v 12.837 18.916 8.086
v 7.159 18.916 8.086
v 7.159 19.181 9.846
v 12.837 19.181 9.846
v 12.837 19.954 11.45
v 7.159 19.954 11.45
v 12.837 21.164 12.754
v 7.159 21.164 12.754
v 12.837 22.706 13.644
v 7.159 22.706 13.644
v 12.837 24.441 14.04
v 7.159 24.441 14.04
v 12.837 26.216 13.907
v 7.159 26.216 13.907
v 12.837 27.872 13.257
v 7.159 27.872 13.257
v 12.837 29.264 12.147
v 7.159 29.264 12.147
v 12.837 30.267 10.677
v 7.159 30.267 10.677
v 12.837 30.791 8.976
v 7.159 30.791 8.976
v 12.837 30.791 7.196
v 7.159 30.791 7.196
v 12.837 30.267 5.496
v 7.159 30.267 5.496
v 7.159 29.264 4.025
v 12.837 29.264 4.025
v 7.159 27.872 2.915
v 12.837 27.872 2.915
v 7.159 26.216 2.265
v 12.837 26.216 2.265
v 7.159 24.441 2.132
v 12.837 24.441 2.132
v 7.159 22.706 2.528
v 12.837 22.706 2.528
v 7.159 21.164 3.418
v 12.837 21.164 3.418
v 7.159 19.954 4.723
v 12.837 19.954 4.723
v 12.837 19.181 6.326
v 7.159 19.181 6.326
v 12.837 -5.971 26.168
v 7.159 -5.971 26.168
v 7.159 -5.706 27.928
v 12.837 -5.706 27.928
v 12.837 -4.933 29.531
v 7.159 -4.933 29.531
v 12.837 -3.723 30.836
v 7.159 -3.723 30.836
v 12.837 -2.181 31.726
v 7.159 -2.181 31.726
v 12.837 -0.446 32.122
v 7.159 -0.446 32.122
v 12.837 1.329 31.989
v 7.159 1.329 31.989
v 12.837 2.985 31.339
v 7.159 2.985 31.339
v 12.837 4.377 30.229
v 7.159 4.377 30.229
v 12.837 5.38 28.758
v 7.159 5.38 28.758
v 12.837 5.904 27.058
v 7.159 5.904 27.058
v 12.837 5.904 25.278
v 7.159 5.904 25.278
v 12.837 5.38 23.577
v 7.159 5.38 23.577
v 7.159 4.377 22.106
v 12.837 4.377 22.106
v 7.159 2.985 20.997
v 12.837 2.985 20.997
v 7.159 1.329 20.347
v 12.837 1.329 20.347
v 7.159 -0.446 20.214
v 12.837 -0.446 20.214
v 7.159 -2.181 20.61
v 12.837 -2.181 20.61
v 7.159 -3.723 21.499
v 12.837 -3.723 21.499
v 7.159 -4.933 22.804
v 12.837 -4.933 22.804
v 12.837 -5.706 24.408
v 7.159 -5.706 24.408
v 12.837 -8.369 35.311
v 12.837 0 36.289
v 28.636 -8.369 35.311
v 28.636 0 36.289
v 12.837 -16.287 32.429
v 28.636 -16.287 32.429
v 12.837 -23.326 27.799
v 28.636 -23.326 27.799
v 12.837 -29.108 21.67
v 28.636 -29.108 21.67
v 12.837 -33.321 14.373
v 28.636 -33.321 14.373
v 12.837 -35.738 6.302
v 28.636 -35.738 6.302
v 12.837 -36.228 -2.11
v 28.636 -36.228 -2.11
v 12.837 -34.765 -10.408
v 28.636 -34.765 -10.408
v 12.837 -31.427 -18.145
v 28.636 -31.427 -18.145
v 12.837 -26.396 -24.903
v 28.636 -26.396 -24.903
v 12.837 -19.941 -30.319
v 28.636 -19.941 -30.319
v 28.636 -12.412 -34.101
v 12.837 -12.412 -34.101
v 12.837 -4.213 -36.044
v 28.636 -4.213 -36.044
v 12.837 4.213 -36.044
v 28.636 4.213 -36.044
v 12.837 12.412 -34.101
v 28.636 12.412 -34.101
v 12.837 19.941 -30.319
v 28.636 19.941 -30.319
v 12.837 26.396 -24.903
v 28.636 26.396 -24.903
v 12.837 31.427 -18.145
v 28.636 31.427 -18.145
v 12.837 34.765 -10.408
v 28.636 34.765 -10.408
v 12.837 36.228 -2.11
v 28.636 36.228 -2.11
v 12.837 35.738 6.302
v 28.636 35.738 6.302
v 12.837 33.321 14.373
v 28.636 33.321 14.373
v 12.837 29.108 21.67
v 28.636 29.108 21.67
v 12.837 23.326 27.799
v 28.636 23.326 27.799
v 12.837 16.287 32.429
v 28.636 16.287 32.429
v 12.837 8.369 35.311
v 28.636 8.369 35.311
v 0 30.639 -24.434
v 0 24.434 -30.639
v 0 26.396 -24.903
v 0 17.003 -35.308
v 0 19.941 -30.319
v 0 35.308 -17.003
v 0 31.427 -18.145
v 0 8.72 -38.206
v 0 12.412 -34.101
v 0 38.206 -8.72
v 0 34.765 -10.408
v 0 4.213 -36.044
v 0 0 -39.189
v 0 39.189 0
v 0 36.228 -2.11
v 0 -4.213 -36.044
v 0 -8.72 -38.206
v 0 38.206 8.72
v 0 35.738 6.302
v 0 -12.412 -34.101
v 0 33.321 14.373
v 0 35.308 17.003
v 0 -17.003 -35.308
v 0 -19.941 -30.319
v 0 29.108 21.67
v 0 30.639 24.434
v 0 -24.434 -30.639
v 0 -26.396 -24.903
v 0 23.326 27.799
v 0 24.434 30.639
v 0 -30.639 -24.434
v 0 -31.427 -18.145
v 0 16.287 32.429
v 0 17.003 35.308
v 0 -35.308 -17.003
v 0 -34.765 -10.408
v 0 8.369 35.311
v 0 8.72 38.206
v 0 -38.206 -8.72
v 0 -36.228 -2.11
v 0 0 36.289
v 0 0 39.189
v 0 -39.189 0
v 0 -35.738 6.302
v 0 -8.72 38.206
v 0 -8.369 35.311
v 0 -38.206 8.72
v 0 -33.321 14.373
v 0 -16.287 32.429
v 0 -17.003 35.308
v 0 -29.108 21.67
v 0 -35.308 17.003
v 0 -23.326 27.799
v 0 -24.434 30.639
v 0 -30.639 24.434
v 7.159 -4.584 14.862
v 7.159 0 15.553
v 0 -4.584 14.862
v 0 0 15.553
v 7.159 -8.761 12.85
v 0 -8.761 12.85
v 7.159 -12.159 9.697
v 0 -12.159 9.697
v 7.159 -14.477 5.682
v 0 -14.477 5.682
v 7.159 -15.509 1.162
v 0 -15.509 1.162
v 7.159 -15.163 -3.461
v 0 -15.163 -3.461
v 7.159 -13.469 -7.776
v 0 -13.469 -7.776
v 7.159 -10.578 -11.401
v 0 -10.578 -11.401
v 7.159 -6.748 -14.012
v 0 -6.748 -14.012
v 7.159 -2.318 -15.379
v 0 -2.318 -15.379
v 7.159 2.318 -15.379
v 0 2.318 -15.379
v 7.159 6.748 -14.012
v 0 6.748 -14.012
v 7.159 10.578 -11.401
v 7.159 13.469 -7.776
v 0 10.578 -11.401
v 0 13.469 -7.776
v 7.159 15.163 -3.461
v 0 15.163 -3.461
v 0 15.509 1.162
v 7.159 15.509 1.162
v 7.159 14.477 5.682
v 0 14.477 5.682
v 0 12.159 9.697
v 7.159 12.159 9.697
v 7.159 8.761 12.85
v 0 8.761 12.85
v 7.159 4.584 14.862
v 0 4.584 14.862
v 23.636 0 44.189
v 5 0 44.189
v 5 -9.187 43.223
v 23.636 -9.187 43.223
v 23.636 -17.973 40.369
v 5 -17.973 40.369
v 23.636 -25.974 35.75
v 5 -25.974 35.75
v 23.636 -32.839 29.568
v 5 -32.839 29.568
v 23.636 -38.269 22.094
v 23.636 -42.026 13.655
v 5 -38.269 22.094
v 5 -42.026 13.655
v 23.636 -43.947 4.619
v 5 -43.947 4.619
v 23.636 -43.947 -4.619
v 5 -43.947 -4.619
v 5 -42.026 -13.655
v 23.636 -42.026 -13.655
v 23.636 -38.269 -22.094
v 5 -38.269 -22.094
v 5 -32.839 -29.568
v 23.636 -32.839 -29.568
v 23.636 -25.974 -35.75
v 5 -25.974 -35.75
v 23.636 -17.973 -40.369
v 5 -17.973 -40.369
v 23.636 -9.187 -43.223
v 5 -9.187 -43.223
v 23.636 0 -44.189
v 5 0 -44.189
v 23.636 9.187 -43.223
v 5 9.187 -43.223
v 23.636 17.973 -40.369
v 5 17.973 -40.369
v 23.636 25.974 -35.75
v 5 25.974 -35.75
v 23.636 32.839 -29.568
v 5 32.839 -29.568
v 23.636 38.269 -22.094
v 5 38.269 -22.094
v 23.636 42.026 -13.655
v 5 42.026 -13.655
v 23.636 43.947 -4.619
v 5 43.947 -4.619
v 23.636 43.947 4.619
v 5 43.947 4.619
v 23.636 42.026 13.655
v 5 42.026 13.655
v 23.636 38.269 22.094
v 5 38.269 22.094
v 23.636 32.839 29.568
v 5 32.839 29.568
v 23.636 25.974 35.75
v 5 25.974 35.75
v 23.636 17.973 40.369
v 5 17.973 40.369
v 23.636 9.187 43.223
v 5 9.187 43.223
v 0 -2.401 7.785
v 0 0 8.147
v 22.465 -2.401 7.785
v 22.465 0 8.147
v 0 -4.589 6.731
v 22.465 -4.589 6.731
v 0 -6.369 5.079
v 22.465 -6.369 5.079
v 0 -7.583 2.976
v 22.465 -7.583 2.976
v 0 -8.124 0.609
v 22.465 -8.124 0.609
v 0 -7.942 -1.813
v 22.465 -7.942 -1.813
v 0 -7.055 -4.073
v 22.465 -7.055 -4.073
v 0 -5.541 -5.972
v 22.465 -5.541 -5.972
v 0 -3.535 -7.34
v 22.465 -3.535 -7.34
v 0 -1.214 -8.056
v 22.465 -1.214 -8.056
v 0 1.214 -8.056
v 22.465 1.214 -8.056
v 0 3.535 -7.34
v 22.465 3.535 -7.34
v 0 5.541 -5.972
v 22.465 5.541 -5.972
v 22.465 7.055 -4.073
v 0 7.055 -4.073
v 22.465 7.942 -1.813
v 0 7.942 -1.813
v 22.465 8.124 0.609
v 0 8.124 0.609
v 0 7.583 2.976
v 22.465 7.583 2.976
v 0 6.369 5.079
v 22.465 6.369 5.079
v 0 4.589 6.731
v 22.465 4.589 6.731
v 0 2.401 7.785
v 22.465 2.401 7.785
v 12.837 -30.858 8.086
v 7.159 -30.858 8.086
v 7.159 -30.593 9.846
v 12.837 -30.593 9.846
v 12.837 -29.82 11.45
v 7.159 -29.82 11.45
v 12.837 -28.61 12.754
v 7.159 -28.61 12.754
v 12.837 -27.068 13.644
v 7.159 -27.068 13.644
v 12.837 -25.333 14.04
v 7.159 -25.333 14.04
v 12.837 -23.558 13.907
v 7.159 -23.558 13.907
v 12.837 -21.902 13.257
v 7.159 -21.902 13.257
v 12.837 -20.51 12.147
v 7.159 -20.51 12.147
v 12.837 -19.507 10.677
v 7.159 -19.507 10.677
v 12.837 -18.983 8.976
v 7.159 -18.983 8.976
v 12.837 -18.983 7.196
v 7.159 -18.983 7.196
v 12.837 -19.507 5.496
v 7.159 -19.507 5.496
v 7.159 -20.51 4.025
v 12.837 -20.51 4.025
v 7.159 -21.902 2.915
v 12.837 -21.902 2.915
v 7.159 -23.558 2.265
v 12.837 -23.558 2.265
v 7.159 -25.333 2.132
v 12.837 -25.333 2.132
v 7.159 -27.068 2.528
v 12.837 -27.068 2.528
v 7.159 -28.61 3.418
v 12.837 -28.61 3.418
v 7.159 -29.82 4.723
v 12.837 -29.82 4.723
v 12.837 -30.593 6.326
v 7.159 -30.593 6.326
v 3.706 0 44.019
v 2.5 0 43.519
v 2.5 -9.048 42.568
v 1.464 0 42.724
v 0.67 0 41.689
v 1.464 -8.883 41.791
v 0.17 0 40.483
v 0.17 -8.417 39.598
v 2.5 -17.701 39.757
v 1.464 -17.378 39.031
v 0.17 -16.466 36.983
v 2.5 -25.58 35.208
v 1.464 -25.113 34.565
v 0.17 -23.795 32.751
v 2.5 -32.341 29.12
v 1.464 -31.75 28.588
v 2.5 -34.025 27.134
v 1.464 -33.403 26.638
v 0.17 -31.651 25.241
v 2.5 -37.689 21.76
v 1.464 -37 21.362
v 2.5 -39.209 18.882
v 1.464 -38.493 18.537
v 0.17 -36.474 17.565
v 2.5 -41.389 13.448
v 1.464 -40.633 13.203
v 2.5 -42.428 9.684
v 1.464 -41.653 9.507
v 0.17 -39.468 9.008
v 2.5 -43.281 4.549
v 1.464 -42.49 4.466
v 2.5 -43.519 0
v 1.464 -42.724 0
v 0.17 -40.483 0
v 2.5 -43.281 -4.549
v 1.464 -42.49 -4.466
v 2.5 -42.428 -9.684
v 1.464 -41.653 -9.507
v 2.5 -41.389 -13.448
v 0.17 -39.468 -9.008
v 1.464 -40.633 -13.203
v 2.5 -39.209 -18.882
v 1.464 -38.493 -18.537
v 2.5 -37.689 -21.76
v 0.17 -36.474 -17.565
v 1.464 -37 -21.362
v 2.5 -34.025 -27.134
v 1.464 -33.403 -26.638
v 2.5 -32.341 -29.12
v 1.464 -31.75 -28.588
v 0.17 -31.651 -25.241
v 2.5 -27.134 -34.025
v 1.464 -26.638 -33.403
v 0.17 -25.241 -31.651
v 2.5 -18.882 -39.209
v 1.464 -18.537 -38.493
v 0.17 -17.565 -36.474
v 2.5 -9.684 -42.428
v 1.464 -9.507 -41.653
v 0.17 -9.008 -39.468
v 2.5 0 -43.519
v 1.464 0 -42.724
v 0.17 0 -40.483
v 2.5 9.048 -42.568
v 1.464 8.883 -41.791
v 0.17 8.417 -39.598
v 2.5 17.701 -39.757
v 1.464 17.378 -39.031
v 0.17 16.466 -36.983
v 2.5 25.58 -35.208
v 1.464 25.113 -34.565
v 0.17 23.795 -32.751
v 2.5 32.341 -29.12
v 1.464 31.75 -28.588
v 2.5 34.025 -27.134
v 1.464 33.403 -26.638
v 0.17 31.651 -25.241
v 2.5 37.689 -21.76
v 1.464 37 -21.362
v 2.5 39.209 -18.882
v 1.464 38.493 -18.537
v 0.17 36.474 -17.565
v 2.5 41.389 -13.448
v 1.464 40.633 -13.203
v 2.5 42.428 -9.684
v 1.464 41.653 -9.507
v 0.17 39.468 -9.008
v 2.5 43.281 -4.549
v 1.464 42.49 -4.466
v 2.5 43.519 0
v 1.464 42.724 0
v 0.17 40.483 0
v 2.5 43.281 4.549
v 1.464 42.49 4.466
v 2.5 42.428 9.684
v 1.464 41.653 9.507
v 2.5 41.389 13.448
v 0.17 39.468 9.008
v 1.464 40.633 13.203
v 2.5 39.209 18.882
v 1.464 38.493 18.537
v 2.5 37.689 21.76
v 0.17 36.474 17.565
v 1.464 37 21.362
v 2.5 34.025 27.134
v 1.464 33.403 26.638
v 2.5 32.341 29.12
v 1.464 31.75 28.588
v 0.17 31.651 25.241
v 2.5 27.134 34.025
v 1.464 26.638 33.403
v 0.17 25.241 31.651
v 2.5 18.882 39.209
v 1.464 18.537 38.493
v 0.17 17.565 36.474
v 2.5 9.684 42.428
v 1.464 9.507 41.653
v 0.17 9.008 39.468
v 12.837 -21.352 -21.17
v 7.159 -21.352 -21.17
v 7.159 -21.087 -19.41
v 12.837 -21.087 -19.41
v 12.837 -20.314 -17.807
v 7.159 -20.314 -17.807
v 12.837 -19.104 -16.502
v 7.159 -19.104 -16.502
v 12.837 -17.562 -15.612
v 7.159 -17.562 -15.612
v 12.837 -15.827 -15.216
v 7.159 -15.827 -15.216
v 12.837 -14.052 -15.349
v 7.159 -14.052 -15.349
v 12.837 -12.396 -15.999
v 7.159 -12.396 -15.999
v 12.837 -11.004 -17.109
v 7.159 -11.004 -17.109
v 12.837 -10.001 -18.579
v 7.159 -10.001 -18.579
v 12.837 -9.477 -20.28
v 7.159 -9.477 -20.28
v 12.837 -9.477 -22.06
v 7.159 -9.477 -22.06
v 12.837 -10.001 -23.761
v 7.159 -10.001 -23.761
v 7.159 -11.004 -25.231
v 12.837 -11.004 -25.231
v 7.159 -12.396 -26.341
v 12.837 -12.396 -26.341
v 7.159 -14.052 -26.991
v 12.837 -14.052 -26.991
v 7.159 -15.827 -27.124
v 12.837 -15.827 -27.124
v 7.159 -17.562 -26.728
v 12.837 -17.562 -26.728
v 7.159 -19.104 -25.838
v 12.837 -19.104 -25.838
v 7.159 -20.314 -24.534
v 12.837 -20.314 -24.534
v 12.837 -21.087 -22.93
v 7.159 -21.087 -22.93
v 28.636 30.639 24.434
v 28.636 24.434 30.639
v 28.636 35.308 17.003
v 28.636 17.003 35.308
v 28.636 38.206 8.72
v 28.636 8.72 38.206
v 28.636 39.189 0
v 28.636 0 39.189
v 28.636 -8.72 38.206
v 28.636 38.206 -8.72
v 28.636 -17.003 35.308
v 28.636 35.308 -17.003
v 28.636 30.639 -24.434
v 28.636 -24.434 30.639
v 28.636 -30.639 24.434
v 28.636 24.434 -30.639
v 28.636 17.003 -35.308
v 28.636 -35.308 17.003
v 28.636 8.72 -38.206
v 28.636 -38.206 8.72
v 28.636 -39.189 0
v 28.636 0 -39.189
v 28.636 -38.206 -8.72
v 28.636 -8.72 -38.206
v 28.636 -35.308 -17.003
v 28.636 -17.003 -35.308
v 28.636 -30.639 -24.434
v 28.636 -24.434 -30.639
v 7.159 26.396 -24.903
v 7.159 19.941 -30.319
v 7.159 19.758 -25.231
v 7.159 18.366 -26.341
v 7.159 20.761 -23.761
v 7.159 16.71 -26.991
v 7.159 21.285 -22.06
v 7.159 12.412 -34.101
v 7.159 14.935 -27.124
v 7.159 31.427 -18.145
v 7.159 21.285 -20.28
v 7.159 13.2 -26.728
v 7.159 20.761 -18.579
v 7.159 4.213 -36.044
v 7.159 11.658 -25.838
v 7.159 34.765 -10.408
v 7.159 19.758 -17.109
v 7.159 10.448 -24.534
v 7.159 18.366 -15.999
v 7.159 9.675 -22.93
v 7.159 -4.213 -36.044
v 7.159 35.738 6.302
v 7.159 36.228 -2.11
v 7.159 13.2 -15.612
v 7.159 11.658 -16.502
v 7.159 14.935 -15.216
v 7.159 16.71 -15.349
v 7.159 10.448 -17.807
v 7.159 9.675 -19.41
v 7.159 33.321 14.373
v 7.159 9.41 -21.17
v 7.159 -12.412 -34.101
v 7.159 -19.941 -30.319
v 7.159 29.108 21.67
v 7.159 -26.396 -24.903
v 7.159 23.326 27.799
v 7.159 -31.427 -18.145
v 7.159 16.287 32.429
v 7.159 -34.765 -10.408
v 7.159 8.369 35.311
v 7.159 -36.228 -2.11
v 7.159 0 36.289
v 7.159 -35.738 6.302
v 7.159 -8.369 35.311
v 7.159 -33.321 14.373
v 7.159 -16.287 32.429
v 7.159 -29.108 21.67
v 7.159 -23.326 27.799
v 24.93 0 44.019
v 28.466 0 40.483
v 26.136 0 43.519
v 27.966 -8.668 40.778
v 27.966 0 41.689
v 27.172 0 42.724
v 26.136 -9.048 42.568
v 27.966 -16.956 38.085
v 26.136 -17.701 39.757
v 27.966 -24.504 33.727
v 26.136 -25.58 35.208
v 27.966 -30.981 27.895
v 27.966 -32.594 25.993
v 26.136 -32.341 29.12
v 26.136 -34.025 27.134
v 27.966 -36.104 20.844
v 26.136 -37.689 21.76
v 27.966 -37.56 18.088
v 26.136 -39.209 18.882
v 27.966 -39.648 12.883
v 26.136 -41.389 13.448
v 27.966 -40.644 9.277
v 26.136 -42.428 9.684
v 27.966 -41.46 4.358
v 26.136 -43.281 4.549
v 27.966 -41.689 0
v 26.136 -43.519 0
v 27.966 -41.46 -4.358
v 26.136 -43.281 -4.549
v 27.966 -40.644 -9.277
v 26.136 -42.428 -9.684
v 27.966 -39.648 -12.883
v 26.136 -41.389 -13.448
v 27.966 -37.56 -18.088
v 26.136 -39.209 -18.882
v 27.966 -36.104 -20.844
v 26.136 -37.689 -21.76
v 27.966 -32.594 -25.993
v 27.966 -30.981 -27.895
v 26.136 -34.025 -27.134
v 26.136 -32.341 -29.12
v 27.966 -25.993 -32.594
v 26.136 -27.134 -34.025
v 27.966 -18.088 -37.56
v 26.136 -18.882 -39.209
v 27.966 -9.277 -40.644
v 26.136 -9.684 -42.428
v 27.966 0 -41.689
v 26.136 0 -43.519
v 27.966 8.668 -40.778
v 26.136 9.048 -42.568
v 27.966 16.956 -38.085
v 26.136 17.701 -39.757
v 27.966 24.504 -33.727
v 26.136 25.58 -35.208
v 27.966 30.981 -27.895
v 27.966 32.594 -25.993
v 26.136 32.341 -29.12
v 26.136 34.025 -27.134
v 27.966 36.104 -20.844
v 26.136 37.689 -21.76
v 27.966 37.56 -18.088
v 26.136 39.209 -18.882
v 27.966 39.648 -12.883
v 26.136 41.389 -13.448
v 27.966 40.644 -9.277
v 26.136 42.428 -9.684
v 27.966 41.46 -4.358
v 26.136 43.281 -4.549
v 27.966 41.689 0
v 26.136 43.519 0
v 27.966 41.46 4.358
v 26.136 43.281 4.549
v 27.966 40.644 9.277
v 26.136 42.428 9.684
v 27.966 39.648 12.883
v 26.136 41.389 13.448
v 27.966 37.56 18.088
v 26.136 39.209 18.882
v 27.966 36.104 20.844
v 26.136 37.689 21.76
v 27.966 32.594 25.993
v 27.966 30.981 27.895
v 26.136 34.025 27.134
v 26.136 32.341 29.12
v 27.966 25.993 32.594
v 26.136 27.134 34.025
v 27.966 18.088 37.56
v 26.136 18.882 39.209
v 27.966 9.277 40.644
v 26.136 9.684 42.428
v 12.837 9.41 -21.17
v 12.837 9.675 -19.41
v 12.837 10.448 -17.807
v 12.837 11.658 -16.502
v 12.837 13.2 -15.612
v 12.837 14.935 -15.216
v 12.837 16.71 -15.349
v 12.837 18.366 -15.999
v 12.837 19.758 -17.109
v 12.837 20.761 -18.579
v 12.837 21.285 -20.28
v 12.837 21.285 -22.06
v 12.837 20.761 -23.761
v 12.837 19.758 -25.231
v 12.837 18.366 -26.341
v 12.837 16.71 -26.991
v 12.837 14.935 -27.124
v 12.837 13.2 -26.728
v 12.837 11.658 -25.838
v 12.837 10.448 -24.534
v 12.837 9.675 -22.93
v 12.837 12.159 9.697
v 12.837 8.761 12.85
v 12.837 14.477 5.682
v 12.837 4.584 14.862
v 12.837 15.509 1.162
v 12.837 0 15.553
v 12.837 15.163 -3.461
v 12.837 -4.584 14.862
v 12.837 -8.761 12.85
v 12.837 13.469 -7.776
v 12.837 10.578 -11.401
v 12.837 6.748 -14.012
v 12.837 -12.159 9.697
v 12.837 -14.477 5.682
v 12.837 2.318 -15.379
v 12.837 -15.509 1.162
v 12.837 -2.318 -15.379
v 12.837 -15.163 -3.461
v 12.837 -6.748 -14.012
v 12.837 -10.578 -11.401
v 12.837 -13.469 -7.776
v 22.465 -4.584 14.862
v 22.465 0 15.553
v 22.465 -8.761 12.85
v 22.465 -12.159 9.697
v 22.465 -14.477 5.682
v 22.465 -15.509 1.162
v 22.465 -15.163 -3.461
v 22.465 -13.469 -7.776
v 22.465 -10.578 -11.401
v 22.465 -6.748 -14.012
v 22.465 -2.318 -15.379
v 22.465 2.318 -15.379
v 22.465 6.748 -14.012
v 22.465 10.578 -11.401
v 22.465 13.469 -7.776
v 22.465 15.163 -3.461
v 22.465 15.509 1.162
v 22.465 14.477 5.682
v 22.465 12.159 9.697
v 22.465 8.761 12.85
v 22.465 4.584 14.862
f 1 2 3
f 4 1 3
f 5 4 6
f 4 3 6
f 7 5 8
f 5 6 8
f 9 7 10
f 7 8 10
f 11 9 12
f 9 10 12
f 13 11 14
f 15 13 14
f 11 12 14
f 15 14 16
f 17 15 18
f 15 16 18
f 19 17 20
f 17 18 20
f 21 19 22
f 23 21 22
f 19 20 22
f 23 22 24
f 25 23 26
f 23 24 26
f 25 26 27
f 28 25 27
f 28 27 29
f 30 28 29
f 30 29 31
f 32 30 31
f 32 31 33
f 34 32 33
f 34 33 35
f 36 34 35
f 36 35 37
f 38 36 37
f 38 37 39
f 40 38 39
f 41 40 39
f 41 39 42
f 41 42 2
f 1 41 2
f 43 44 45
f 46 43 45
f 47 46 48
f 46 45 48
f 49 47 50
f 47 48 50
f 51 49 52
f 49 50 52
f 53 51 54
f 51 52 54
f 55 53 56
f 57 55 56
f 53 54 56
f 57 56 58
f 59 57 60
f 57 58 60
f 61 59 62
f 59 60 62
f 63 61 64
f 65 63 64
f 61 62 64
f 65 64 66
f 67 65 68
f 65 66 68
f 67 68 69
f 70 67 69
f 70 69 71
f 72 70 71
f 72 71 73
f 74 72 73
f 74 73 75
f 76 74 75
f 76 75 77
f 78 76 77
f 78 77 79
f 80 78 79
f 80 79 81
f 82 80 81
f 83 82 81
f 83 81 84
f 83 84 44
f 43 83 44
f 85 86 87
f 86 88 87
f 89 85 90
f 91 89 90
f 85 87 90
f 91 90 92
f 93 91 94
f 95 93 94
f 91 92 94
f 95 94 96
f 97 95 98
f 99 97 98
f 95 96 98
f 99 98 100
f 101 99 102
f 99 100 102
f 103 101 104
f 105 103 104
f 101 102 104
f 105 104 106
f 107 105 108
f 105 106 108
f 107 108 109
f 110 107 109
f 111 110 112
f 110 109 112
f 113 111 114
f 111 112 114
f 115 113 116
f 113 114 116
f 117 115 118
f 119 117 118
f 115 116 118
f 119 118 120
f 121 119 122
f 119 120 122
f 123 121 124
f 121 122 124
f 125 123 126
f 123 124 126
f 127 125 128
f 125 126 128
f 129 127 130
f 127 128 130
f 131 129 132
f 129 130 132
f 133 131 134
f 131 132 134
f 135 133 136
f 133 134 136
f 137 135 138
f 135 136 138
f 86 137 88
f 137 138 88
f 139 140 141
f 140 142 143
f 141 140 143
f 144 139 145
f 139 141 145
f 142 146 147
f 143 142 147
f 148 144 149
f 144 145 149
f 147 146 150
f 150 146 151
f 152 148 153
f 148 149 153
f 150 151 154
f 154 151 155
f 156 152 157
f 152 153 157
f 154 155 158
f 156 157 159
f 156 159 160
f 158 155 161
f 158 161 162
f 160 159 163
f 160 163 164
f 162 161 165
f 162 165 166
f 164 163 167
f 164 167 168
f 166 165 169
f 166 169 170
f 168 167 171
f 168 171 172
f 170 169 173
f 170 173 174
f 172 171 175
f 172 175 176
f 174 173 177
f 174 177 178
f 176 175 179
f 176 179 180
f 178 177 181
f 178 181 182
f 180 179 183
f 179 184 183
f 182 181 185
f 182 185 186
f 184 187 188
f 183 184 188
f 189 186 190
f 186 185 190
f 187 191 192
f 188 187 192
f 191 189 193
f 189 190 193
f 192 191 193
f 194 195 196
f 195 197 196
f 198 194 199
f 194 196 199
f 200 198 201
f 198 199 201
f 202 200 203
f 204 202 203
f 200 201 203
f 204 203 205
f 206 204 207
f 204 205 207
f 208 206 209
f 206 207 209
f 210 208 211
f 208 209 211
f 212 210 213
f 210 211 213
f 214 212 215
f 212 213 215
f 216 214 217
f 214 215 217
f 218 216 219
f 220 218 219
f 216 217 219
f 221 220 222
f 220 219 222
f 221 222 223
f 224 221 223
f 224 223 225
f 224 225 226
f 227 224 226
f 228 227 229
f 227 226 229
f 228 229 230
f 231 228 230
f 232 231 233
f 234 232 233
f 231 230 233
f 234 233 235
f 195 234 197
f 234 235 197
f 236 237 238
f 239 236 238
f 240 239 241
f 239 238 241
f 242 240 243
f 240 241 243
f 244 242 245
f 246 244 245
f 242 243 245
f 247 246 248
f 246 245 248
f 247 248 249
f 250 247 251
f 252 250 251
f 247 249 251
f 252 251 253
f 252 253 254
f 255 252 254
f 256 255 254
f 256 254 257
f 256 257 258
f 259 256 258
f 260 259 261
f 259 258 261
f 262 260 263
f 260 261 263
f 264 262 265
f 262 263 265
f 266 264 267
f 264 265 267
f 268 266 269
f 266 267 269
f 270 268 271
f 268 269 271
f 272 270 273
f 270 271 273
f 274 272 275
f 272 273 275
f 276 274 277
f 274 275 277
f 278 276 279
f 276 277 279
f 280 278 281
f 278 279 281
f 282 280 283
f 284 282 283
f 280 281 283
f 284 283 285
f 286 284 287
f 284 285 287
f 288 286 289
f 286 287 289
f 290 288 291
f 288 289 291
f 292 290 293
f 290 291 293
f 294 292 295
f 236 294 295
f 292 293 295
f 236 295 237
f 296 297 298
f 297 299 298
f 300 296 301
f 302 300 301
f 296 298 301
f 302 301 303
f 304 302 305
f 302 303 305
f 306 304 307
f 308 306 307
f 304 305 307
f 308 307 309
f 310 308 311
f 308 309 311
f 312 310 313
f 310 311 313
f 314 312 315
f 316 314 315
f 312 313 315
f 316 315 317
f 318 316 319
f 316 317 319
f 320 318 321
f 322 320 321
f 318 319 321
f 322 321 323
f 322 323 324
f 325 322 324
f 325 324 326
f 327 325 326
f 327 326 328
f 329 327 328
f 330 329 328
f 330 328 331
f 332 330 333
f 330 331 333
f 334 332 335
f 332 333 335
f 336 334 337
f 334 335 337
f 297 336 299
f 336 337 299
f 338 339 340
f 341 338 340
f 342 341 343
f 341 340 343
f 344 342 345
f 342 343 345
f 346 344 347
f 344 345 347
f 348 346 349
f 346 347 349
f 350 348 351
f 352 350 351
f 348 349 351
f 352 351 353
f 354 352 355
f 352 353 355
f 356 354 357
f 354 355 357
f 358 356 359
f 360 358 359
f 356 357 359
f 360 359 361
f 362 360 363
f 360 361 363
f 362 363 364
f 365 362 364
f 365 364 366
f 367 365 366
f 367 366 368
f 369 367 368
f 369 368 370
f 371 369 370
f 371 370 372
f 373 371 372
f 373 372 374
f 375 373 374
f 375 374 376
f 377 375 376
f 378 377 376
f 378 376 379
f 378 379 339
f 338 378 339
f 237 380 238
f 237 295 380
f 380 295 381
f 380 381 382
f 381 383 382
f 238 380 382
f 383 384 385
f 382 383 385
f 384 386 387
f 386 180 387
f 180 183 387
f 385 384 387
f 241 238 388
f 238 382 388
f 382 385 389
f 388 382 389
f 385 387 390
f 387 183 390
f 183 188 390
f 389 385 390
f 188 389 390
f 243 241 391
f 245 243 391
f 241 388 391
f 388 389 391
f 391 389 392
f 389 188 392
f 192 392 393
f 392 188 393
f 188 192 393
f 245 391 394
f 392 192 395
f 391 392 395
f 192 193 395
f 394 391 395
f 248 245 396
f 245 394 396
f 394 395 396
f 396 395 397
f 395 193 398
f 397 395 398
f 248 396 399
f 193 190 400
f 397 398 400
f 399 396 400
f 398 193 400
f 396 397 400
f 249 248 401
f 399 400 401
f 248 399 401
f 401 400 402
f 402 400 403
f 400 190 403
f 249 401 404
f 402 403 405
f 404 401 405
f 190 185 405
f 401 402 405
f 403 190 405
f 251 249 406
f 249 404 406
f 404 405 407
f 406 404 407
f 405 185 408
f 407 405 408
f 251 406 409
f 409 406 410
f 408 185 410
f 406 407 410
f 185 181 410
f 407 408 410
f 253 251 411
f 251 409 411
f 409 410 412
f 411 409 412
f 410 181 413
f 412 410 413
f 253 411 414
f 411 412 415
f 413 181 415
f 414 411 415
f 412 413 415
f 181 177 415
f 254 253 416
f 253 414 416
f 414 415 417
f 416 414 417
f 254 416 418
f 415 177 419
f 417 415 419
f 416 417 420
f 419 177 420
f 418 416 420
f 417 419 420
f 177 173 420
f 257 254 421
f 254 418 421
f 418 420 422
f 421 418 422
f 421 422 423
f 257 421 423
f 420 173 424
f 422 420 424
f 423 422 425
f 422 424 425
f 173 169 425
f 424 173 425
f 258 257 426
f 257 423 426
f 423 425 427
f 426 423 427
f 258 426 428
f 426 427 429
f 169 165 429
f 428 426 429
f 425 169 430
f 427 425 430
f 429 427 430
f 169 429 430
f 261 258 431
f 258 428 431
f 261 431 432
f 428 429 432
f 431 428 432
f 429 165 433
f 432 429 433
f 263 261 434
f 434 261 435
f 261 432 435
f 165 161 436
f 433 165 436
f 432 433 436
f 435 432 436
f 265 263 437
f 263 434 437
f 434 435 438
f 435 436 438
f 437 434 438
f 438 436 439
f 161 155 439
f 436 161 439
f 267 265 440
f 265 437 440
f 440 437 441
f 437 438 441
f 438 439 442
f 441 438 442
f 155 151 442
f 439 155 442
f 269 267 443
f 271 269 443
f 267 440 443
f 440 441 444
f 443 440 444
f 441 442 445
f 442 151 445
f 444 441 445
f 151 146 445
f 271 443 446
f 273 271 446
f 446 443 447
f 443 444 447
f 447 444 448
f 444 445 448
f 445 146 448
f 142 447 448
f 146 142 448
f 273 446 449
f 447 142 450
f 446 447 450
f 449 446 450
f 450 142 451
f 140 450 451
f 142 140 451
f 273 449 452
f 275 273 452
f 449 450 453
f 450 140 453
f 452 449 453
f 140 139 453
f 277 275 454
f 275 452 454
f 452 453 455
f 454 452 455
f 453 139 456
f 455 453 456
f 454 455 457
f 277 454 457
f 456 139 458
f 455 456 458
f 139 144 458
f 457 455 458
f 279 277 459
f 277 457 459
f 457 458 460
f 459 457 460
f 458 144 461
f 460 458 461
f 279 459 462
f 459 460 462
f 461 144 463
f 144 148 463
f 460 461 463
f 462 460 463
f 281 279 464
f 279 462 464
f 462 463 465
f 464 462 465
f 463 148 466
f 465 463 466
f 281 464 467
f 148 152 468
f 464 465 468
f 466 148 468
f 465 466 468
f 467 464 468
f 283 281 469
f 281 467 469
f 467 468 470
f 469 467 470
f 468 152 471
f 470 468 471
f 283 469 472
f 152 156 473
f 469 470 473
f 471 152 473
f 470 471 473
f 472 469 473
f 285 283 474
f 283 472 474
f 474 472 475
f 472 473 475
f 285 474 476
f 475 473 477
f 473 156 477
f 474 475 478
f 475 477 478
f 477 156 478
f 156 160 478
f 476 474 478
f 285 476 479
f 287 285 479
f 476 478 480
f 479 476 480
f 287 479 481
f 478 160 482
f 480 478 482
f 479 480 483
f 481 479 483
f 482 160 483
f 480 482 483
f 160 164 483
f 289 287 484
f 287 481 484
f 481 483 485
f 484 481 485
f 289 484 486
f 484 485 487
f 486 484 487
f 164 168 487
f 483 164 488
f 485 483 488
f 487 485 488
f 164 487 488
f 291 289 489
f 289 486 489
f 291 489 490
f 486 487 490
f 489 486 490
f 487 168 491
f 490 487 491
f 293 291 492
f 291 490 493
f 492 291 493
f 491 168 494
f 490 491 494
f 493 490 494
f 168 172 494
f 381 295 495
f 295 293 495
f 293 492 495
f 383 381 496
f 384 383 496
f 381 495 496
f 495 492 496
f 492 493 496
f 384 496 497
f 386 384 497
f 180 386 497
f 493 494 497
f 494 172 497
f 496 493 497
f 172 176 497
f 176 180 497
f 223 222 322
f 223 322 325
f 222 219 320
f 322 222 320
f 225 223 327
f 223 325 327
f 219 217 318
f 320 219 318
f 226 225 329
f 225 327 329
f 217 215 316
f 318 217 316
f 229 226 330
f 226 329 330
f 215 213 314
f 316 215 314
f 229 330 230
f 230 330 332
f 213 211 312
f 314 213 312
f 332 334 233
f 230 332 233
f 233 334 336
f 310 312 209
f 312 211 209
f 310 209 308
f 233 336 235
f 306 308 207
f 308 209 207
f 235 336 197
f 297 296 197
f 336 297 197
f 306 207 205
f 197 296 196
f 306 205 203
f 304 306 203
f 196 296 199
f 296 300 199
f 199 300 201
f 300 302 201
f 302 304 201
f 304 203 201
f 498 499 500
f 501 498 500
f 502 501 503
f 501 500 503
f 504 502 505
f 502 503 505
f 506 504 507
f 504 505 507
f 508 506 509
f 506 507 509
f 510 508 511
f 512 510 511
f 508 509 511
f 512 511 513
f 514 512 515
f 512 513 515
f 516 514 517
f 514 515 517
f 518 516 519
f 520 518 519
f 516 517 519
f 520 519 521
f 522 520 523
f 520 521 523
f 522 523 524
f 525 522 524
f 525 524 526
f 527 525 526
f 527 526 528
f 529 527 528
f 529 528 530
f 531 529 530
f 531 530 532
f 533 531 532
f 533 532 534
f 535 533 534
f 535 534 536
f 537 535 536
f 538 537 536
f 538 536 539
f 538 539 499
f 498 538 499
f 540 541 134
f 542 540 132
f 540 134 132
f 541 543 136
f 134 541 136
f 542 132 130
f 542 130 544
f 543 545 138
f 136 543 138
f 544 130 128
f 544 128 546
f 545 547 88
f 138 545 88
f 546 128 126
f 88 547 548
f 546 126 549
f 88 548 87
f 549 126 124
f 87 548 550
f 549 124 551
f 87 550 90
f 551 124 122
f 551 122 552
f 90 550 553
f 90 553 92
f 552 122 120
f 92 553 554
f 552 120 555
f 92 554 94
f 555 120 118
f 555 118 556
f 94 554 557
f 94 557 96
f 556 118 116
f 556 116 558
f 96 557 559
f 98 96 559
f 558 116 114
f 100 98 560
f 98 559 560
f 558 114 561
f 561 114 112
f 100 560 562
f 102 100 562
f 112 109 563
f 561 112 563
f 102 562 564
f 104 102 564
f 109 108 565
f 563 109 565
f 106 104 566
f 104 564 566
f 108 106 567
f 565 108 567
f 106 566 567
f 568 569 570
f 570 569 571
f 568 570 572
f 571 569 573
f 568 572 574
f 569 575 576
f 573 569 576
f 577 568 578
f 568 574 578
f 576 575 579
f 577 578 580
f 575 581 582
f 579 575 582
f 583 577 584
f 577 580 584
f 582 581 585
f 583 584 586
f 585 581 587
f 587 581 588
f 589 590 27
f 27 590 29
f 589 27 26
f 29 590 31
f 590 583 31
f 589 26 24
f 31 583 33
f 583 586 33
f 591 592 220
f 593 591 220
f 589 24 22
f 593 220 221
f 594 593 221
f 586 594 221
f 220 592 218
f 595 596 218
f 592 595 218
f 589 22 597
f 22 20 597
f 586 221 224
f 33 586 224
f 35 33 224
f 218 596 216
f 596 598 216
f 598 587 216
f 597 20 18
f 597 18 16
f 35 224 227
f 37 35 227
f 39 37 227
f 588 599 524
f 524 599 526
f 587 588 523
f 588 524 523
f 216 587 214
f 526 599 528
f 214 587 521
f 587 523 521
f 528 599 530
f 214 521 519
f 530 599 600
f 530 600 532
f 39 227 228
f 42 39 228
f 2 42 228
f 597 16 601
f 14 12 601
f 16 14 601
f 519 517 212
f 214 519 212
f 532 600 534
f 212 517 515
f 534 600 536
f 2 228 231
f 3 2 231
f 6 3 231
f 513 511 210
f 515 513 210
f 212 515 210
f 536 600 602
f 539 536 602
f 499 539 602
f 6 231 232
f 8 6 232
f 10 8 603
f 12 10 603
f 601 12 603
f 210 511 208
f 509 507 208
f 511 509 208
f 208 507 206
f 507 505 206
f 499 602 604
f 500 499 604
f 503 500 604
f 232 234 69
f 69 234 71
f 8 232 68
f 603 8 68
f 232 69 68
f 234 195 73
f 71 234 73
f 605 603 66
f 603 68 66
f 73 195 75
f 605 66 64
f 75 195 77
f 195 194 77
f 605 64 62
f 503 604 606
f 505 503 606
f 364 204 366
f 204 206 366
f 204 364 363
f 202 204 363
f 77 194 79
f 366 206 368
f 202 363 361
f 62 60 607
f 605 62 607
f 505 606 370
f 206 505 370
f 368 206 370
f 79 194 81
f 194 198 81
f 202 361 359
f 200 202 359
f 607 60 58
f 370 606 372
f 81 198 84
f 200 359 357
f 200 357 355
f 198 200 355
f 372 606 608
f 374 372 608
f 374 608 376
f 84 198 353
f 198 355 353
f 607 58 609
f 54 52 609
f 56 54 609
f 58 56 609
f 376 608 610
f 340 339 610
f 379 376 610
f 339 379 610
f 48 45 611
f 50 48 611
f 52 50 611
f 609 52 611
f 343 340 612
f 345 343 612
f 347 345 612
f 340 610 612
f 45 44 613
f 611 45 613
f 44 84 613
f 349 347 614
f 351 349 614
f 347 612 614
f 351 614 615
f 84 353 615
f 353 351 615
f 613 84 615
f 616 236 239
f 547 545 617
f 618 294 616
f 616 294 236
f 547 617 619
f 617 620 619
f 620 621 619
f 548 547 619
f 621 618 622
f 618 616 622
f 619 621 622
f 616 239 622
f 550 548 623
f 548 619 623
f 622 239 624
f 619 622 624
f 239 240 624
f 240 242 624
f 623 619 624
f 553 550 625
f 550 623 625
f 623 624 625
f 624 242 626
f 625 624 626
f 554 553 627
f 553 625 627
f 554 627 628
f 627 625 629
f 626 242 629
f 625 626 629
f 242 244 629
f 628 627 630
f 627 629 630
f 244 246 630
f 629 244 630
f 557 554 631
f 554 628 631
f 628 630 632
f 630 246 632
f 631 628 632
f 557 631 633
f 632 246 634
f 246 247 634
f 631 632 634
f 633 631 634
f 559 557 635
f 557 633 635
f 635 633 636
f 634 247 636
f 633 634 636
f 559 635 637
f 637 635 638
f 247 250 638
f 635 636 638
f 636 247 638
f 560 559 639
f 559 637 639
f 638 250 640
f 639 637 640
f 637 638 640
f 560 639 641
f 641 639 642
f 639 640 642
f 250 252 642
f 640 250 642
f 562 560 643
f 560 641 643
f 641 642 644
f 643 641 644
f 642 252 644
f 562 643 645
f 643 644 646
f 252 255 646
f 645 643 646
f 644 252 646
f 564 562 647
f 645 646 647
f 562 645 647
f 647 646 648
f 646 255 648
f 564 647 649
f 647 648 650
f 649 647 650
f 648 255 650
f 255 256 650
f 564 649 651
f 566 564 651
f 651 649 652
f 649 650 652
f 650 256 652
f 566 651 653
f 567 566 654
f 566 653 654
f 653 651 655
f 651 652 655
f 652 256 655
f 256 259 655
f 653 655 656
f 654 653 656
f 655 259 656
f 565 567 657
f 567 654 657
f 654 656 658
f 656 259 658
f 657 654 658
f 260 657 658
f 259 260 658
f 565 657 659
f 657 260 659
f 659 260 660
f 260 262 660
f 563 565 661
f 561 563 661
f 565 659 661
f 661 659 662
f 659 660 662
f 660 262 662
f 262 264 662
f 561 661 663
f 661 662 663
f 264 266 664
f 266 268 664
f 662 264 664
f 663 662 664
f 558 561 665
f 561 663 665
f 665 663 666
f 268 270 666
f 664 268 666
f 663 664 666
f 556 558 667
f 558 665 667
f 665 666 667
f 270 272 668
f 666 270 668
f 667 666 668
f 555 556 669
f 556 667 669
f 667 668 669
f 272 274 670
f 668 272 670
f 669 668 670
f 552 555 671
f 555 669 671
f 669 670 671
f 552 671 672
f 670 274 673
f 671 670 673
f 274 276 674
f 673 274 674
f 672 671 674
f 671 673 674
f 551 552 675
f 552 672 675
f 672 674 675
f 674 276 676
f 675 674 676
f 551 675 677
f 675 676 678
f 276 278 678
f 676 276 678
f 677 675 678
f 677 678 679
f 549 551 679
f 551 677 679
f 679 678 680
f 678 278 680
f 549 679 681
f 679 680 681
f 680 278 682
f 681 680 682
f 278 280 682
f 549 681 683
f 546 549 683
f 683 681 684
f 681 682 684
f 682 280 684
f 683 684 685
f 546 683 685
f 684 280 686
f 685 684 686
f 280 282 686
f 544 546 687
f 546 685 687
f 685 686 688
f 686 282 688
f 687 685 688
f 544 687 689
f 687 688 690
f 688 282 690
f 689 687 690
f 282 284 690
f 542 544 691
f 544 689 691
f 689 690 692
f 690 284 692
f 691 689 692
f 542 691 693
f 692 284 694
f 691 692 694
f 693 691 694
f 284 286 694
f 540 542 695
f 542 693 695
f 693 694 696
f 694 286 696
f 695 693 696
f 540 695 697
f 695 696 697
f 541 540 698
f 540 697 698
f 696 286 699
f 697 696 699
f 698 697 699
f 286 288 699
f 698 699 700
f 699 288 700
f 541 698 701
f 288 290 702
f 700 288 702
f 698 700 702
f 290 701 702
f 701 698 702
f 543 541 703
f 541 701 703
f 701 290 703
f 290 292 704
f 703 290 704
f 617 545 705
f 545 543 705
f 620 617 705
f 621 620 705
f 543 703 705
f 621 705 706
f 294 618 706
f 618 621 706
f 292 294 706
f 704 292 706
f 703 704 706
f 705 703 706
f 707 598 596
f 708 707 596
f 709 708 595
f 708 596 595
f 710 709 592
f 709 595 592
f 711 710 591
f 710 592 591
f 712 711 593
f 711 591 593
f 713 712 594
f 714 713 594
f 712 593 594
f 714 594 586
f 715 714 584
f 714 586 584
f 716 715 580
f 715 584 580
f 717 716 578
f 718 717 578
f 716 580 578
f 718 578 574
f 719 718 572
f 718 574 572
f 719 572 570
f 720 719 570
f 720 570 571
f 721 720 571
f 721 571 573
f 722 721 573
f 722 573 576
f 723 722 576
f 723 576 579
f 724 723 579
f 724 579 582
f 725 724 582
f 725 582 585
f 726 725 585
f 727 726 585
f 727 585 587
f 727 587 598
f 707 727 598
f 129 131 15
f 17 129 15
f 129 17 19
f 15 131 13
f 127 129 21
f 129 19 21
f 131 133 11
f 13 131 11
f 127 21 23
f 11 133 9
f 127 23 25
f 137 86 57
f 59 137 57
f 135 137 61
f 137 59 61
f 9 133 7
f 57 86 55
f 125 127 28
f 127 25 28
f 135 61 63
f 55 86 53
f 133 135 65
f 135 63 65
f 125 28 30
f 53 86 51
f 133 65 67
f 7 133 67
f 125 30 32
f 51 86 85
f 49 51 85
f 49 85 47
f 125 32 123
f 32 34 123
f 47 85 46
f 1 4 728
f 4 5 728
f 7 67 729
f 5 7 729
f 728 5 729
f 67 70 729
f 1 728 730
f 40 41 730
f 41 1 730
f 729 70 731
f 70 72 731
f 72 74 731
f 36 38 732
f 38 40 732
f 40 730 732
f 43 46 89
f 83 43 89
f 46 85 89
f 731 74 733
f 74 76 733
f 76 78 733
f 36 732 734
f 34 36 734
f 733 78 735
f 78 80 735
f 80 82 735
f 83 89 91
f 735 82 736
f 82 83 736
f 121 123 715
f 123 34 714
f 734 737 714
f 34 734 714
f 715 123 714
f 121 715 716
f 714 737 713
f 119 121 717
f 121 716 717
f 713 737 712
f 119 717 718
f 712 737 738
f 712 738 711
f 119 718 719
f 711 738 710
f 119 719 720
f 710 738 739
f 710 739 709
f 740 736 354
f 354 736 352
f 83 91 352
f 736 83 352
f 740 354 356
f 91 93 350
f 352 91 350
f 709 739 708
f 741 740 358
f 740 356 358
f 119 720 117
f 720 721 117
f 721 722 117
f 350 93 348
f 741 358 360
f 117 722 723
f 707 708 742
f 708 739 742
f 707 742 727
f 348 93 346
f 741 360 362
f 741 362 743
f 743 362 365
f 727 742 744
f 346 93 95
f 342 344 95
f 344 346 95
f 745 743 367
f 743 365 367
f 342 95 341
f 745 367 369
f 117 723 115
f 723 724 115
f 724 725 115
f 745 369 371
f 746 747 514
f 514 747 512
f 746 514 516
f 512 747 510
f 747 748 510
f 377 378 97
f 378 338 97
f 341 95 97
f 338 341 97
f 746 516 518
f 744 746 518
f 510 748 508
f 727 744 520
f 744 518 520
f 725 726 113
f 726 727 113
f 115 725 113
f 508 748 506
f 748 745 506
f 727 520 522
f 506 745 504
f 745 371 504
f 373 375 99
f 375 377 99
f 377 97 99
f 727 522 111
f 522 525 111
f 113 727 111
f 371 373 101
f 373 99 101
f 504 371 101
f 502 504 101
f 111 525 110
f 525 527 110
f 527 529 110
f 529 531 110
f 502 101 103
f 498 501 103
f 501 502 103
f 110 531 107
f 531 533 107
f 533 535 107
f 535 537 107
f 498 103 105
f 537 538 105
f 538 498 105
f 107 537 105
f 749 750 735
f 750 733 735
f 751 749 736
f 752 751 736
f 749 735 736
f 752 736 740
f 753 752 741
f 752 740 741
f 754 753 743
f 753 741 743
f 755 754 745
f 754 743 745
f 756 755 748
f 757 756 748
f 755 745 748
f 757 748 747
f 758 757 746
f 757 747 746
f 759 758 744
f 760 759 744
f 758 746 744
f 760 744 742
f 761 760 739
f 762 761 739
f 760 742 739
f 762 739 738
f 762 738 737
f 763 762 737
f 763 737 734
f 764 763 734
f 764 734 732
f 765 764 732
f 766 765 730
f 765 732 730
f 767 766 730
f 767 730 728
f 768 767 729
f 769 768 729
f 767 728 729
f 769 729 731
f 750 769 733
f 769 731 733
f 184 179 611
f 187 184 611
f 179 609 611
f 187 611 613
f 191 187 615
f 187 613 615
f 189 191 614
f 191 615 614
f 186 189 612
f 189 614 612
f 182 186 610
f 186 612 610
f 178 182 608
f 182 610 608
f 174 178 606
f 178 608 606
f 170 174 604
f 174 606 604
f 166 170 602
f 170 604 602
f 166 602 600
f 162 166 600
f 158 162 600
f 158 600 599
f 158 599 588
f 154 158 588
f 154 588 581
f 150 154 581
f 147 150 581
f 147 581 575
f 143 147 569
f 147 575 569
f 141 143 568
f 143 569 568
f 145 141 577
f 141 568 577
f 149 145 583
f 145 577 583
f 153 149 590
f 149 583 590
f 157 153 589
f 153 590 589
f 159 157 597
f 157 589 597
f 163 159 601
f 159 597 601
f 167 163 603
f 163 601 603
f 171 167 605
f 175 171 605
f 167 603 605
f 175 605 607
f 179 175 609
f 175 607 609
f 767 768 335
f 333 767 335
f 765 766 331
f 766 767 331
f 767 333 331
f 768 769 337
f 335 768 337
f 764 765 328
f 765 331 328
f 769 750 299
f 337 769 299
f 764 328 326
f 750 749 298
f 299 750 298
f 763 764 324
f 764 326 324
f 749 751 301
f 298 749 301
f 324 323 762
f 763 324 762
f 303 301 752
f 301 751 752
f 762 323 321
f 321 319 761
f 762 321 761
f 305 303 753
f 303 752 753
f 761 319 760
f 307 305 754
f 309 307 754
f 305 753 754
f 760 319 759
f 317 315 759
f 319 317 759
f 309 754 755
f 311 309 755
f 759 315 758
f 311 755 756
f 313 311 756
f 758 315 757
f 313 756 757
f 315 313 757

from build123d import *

# Parameters (mm, degrees)
F3_R     = 5
F2_R     = 5.970873
F4_DEPTH = 25


with BuildPart() as f1:
    # F0 (on Front) → F1 (revolve)
    with BuildSketch(Plane.XZ):
        Polygon((7.159092, 15.552509), (0, 15.552509), (0, 8.146551), (22.464735, 8.146551), (22.464735, 15.552509), (12.836992, 15.552509), (12.836992, 36.289185), (28.636364, 36.289185), (28.636364, 44.188876), (0, 44.188876), (0, 36.289185), (7.159092, 36.289185), align=None)
    revolve(axis=Axis((9.257446, 0, 0), (1, 0, 0)))

    # F3
    f3_edges = [f1.edges().sort_by_distance(p)[0] for p in [
        (28.636364, 0, -44.188876),
        (0, 0, -44.188876),
    ]]
    fillet(f3_edges, radius=F3_R)

    # F2 (on face) → F4 (cut)
    with BuildSketch(Plane(origin=(7.159092, 0, 0), x_dir=(0, -1, 0), z_dir=(-1, 0, 0))):
        with Locations((0, 26.167713)):
            Circle(F2_R)
        with Locations((-24.886974, 8.086268)):
            Circle(F2_R)
        with Locations((24.886974, 8.086268)):
            Circle(F2_R)
        with Locations((-15.380996, -21.170125)):
            Circle(F2_R)
        with Locations((15.380996, -21.170125)):
            Circle(F2_R)
    extrude(amount=-F4_DEPTH, mode=Mode.SUBTRACT)


solid = f1.part
